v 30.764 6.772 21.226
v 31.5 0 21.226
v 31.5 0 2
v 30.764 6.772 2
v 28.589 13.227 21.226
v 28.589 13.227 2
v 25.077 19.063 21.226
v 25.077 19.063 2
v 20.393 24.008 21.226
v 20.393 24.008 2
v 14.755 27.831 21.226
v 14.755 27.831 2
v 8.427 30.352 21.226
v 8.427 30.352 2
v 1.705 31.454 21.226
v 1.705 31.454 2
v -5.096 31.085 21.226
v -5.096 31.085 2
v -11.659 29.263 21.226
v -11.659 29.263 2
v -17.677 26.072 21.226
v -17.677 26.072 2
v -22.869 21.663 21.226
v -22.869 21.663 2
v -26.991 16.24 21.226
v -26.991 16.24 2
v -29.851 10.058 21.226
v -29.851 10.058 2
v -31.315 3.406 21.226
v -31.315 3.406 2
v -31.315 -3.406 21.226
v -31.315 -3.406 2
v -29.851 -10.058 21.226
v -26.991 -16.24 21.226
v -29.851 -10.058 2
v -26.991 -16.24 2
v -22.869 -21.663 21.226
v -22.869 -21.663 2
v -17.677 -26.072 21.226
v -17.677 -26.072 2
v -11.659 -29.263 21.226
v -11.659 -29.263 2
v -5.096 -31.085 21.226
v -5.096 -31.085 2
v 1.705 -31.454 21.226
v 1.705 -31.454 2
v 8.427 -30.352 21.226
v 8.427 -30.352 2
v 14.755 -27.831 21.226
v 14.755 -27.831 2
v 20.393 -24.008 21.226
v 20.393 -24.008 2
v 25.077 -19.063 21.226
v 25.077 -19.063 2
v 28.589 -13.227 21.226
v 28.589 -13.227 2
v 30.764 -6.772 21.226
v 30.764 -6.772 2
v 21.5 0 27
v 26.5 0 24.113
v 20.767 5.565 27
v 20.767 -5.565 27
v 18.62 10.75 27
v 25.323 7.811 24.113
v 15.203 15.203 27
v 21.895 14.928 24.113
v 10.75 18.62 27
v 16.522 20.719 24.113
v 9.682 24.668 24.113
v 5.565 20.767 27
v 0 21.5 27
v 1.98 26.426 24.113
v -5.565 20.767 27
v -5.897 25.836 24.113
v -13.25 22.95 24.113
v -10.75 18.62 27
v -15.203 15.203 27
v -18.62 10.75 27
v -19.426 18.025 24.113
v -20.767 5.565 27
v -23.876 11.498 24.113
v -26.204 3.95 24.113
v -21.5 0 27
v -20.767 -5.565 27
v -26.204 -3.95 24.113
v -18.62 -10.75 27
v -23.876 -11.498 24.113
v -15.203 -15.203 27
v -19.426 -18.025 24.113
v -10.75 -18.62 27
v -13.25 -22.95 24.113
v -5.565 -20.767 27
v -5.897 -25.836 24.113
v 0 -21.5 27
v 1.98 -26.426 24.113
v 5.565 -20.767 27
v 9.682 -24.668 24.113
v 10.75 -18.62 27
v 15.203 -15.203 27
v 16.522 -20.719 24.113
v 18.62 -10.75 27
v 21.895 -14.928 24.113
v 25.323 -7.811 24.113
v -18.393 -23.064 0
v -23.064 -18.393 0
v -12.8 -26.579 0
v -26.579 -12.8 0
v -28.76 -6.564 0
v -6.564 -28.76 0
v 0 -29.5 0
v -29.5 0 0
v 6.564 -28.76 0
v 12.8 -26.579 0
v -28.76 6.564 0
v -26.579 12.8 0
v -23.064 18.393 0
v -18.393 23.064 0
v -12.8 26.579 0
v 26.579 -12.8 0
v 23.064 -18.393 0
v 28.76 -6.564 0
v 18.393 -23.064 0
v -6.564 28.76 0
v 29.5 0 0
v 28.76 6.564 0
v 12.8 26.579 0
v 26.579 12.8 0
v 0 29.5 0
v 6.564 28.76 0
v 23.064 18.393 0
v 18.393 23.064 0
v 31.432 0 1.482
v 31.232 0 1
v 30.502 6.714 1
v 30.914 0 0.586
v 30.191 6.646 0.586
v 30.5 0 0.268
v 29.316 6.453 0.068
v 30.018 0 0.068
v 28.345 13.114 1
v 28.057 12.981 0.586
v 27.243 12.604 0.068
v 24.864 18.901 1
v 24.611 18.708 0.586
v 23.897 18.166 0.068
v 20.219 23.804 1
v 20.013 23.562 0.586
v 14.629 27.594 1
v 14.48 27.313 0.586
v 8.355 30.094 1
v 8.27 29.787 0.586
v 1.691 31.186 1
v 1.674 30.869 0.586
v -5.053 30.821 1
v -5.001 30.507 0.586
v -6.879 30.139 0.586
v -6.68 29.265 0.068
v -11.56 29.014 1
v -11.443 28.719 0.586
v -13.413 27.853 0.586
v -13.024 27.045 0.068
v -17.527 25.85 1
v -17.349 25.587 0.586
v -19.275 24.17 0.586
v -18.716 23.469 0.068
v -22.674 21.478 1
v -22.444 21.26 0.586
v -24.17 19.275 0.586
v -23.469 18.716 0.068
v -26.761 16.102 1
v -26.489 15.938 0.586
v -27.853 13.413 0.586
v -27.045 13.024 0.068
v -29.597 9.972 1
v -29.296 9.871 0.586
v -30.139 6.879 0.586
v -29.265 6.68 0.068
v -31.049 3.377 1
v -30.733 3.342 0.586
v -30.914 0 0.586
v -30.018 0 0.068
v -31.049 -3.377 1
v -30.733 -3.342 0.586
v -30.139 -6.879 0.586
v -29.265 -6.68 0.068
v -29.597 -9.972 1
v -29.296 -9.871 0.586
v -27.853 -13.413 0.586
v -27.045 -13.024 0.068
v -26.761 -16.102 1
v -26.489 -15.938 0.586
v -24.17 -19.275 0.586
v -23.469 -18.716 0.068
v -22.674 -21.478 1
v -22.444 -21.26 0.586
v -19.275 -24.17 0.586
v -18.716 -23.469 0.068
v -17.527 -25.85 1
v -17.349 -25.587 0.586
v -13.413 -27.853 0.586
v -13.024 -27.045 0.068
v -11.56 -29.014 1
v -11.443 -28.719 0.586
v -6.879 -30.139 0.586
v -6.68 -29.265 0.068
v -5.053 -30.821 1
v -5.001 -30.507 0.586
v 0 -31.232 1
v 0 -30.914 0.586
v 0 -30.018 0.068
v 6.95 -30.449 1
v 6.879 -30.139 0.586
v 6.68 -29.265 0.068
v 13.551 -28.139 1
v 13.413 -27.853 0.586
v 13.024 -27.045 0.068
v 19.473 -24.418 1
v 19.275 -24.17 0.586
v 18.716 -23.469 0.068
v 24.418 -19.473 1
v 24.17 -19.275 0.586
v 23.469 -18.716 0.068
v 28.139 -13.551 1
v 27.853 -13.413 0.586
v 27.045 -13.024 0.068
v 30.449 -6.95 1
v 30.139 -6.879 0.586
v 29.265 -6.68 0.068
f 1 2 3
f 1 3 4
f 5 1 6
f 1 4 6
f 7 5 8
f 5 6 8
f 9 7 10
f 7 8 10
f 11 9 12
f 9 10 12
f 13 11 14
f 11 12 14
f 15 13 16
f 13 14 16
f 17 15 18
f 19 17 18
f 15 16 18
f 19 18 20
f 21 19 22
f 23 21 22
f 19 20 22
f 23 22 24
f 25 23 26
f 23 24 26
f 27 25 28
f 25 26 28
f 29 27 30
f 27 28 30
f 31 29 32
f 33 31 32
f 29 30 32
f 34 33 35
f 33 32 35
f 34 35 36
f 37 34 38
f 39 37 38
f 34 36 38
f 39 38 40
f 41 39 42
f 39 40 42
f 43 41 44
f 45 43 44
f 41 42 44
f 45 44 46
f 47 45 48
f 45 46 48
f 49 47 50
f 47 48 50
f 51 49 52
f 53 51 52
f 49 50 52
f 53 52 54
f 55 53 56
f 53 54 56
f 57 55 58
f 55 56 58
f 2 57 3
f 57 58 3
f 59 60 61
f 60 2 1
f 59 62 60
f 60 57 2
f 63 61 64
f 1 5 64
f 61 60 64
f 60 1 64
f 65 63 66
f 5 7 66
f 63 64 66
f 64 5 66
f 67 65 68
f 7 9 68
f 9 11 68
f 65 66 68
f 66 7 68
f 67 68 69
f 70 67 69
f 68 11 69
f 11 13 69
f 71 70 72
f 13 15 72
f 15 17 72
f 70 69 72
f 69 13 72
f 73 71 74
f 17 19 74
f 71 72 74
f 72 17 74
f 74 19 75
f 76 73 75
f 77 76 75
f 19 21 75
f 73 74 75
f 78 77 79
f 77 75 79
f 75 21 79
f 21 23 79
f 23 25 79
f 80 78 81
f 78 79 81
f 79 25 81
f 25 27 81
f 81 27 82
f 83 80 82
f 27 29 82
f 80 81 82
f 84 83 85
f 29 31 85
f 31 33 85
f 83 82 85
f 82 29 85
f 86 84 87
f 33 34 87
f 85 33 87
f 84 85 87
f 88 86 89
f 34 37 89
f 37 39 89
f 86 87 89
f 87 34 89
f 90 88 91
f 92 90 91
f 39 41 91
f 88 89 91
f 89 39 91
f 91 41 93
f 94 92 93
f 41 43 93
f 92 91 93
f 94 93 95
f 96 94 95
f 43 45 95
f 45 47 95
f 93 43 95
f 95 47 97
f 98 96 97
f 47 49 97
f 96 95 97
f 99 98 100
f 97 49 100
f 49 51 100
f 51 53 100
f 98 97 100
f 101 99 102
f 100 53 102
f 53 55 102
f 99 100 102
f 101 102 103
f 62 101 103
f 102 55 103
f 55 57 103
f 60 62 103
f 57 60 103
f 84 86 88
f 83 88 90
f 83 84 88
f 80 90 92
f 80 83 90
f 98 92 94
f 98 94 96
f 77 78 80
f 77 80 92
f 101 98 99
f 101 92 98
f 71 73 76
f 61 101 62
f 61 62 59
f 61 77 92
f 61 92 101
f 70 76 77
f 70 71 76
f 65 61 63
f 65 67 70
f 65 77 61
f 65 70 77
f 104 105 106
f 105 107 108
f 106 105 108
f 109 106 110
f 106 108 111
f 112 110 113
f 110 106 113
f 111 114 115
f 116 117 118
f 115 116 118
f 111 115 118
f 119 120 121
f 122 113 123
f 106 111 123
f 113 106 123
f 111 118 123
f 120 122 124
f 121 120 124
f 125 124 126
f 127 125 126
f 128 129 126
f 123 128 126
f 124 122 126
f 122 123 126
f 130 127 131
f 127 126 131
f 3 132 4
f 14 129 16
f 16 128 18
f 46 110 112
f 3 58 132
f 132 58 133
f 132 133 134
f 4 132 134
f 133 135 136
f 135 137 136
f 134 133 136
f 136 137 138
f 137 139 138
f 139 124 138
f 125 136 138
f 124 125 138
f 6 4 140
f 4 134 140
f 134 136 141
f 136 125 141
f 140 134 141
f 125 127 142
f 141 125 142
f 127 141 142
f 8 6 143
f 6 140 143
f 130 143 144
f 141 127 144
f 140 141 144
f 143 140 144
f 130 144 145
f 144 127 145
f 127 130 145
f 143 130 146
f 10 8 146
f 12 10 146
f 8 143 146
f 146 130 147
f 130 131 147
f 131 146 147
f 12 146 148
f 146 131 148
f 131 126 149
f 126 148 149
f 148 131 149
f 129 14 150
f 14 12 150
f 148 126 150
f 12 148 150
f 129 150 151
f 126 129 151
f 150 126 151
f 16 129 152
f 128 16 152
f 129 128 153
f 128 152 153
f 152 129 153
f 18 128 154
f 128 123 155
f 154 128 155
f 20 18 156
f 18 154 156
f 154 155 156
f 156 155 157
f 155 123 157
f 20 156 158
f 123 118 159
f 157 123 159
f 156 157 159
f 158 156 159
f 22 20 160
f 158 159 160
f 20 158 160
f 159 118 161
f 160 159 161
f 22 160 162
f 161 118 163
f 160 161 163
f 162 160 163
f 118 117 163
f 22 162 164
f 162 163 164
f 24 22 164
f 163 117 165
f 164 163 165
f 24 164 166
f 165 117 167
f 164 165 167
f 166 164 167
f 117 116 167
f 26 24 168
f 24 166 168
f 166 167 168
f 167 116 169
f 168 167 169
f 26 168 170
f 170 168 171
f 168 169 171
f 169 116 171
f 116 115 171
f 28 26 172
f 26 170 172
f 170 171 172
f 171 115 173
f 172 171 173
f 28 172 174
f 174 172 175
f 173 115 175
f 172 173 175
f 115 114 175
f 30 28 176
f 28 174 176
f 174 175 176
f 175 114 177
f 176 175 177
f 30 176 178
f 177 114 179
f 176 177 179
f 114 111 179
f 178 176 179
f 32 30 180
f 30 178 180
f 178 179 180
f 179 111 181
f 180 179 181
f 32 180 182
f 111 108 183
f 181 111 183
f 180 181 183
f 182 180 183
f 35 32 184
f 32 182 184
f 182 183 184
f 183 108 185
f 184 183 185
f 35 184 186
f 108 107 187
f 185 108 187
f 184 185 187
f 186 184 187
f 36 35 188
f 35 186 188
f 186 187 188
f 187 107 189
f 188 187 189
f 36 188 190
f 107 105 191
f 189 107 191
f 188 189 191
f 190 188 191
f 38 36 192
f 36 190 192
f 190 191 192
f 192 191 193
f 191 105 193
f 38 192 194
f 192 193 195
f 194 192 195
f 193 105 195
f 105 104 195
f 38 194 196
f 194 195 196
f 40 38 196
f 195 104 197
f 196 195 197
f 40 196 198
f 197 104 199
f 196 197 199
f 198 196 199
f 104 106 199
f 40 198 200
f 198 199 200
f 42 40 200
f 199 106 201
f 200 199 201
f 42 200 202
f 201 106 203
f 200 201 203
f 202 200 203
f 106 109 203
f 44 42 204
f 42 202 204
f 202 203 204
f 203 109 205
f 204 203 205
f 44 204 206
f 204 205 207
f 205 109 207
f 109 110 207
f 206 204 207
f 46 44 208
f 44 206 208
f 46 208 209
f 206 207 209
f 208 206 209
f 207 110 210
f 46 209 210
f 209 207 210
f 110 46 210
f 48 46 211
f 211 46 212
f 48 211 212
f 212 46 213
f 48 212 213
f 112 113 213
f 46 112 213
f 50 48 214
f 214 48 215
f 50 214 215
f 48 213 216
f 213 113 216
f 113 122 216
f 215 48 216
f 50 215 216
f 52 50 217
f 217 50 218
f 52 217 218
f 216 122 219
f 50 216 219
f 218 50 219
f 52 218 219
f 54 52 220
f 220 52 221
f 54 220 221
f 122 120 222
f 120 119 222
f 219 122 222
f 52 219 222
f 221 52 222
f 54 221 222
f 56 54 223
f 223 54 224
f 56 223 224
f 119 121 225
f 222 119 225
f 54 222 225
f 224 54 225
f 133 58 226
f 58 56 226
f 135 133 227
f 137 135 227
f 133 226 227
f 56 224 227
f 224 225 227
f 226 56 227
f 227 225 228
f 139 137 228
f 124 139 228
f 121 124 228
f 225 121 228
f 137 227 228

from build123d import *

# Parameters (mm, degrees)
F0_R     = 31.5
F1_DEPTH = 27
F2_SIZE2 = 5.7735026919
F2_SIZE  = 10
F3_R     = 2


with BuildPart() as f1:
    # F0 (on Top) → F1 (new body)
    with BuildSketch(Plane.XY):
        Circle(F0_R)
    extrude(amount=F1_DEPTH)

    # F2
    f2_edges = [f1.edges().sort_by_distance(p)[0] for p in [
        (-31.5, 0, 27),
    ]]
    f2_side = f1.faces().sort_by_distance((0, 0, 27))[0]
    chamfer(f2_edges, length=F2_SIZE, length2=F2_SIZE2, reference=f2_side)

    # F3
    f3_edges = [f1.edges().sort_by_distance(p)[0] for p in [
        (-31.5, 0, 0),
    ]]
    fillet(f3_edges, radius=F3_R)


solid = f1.part
